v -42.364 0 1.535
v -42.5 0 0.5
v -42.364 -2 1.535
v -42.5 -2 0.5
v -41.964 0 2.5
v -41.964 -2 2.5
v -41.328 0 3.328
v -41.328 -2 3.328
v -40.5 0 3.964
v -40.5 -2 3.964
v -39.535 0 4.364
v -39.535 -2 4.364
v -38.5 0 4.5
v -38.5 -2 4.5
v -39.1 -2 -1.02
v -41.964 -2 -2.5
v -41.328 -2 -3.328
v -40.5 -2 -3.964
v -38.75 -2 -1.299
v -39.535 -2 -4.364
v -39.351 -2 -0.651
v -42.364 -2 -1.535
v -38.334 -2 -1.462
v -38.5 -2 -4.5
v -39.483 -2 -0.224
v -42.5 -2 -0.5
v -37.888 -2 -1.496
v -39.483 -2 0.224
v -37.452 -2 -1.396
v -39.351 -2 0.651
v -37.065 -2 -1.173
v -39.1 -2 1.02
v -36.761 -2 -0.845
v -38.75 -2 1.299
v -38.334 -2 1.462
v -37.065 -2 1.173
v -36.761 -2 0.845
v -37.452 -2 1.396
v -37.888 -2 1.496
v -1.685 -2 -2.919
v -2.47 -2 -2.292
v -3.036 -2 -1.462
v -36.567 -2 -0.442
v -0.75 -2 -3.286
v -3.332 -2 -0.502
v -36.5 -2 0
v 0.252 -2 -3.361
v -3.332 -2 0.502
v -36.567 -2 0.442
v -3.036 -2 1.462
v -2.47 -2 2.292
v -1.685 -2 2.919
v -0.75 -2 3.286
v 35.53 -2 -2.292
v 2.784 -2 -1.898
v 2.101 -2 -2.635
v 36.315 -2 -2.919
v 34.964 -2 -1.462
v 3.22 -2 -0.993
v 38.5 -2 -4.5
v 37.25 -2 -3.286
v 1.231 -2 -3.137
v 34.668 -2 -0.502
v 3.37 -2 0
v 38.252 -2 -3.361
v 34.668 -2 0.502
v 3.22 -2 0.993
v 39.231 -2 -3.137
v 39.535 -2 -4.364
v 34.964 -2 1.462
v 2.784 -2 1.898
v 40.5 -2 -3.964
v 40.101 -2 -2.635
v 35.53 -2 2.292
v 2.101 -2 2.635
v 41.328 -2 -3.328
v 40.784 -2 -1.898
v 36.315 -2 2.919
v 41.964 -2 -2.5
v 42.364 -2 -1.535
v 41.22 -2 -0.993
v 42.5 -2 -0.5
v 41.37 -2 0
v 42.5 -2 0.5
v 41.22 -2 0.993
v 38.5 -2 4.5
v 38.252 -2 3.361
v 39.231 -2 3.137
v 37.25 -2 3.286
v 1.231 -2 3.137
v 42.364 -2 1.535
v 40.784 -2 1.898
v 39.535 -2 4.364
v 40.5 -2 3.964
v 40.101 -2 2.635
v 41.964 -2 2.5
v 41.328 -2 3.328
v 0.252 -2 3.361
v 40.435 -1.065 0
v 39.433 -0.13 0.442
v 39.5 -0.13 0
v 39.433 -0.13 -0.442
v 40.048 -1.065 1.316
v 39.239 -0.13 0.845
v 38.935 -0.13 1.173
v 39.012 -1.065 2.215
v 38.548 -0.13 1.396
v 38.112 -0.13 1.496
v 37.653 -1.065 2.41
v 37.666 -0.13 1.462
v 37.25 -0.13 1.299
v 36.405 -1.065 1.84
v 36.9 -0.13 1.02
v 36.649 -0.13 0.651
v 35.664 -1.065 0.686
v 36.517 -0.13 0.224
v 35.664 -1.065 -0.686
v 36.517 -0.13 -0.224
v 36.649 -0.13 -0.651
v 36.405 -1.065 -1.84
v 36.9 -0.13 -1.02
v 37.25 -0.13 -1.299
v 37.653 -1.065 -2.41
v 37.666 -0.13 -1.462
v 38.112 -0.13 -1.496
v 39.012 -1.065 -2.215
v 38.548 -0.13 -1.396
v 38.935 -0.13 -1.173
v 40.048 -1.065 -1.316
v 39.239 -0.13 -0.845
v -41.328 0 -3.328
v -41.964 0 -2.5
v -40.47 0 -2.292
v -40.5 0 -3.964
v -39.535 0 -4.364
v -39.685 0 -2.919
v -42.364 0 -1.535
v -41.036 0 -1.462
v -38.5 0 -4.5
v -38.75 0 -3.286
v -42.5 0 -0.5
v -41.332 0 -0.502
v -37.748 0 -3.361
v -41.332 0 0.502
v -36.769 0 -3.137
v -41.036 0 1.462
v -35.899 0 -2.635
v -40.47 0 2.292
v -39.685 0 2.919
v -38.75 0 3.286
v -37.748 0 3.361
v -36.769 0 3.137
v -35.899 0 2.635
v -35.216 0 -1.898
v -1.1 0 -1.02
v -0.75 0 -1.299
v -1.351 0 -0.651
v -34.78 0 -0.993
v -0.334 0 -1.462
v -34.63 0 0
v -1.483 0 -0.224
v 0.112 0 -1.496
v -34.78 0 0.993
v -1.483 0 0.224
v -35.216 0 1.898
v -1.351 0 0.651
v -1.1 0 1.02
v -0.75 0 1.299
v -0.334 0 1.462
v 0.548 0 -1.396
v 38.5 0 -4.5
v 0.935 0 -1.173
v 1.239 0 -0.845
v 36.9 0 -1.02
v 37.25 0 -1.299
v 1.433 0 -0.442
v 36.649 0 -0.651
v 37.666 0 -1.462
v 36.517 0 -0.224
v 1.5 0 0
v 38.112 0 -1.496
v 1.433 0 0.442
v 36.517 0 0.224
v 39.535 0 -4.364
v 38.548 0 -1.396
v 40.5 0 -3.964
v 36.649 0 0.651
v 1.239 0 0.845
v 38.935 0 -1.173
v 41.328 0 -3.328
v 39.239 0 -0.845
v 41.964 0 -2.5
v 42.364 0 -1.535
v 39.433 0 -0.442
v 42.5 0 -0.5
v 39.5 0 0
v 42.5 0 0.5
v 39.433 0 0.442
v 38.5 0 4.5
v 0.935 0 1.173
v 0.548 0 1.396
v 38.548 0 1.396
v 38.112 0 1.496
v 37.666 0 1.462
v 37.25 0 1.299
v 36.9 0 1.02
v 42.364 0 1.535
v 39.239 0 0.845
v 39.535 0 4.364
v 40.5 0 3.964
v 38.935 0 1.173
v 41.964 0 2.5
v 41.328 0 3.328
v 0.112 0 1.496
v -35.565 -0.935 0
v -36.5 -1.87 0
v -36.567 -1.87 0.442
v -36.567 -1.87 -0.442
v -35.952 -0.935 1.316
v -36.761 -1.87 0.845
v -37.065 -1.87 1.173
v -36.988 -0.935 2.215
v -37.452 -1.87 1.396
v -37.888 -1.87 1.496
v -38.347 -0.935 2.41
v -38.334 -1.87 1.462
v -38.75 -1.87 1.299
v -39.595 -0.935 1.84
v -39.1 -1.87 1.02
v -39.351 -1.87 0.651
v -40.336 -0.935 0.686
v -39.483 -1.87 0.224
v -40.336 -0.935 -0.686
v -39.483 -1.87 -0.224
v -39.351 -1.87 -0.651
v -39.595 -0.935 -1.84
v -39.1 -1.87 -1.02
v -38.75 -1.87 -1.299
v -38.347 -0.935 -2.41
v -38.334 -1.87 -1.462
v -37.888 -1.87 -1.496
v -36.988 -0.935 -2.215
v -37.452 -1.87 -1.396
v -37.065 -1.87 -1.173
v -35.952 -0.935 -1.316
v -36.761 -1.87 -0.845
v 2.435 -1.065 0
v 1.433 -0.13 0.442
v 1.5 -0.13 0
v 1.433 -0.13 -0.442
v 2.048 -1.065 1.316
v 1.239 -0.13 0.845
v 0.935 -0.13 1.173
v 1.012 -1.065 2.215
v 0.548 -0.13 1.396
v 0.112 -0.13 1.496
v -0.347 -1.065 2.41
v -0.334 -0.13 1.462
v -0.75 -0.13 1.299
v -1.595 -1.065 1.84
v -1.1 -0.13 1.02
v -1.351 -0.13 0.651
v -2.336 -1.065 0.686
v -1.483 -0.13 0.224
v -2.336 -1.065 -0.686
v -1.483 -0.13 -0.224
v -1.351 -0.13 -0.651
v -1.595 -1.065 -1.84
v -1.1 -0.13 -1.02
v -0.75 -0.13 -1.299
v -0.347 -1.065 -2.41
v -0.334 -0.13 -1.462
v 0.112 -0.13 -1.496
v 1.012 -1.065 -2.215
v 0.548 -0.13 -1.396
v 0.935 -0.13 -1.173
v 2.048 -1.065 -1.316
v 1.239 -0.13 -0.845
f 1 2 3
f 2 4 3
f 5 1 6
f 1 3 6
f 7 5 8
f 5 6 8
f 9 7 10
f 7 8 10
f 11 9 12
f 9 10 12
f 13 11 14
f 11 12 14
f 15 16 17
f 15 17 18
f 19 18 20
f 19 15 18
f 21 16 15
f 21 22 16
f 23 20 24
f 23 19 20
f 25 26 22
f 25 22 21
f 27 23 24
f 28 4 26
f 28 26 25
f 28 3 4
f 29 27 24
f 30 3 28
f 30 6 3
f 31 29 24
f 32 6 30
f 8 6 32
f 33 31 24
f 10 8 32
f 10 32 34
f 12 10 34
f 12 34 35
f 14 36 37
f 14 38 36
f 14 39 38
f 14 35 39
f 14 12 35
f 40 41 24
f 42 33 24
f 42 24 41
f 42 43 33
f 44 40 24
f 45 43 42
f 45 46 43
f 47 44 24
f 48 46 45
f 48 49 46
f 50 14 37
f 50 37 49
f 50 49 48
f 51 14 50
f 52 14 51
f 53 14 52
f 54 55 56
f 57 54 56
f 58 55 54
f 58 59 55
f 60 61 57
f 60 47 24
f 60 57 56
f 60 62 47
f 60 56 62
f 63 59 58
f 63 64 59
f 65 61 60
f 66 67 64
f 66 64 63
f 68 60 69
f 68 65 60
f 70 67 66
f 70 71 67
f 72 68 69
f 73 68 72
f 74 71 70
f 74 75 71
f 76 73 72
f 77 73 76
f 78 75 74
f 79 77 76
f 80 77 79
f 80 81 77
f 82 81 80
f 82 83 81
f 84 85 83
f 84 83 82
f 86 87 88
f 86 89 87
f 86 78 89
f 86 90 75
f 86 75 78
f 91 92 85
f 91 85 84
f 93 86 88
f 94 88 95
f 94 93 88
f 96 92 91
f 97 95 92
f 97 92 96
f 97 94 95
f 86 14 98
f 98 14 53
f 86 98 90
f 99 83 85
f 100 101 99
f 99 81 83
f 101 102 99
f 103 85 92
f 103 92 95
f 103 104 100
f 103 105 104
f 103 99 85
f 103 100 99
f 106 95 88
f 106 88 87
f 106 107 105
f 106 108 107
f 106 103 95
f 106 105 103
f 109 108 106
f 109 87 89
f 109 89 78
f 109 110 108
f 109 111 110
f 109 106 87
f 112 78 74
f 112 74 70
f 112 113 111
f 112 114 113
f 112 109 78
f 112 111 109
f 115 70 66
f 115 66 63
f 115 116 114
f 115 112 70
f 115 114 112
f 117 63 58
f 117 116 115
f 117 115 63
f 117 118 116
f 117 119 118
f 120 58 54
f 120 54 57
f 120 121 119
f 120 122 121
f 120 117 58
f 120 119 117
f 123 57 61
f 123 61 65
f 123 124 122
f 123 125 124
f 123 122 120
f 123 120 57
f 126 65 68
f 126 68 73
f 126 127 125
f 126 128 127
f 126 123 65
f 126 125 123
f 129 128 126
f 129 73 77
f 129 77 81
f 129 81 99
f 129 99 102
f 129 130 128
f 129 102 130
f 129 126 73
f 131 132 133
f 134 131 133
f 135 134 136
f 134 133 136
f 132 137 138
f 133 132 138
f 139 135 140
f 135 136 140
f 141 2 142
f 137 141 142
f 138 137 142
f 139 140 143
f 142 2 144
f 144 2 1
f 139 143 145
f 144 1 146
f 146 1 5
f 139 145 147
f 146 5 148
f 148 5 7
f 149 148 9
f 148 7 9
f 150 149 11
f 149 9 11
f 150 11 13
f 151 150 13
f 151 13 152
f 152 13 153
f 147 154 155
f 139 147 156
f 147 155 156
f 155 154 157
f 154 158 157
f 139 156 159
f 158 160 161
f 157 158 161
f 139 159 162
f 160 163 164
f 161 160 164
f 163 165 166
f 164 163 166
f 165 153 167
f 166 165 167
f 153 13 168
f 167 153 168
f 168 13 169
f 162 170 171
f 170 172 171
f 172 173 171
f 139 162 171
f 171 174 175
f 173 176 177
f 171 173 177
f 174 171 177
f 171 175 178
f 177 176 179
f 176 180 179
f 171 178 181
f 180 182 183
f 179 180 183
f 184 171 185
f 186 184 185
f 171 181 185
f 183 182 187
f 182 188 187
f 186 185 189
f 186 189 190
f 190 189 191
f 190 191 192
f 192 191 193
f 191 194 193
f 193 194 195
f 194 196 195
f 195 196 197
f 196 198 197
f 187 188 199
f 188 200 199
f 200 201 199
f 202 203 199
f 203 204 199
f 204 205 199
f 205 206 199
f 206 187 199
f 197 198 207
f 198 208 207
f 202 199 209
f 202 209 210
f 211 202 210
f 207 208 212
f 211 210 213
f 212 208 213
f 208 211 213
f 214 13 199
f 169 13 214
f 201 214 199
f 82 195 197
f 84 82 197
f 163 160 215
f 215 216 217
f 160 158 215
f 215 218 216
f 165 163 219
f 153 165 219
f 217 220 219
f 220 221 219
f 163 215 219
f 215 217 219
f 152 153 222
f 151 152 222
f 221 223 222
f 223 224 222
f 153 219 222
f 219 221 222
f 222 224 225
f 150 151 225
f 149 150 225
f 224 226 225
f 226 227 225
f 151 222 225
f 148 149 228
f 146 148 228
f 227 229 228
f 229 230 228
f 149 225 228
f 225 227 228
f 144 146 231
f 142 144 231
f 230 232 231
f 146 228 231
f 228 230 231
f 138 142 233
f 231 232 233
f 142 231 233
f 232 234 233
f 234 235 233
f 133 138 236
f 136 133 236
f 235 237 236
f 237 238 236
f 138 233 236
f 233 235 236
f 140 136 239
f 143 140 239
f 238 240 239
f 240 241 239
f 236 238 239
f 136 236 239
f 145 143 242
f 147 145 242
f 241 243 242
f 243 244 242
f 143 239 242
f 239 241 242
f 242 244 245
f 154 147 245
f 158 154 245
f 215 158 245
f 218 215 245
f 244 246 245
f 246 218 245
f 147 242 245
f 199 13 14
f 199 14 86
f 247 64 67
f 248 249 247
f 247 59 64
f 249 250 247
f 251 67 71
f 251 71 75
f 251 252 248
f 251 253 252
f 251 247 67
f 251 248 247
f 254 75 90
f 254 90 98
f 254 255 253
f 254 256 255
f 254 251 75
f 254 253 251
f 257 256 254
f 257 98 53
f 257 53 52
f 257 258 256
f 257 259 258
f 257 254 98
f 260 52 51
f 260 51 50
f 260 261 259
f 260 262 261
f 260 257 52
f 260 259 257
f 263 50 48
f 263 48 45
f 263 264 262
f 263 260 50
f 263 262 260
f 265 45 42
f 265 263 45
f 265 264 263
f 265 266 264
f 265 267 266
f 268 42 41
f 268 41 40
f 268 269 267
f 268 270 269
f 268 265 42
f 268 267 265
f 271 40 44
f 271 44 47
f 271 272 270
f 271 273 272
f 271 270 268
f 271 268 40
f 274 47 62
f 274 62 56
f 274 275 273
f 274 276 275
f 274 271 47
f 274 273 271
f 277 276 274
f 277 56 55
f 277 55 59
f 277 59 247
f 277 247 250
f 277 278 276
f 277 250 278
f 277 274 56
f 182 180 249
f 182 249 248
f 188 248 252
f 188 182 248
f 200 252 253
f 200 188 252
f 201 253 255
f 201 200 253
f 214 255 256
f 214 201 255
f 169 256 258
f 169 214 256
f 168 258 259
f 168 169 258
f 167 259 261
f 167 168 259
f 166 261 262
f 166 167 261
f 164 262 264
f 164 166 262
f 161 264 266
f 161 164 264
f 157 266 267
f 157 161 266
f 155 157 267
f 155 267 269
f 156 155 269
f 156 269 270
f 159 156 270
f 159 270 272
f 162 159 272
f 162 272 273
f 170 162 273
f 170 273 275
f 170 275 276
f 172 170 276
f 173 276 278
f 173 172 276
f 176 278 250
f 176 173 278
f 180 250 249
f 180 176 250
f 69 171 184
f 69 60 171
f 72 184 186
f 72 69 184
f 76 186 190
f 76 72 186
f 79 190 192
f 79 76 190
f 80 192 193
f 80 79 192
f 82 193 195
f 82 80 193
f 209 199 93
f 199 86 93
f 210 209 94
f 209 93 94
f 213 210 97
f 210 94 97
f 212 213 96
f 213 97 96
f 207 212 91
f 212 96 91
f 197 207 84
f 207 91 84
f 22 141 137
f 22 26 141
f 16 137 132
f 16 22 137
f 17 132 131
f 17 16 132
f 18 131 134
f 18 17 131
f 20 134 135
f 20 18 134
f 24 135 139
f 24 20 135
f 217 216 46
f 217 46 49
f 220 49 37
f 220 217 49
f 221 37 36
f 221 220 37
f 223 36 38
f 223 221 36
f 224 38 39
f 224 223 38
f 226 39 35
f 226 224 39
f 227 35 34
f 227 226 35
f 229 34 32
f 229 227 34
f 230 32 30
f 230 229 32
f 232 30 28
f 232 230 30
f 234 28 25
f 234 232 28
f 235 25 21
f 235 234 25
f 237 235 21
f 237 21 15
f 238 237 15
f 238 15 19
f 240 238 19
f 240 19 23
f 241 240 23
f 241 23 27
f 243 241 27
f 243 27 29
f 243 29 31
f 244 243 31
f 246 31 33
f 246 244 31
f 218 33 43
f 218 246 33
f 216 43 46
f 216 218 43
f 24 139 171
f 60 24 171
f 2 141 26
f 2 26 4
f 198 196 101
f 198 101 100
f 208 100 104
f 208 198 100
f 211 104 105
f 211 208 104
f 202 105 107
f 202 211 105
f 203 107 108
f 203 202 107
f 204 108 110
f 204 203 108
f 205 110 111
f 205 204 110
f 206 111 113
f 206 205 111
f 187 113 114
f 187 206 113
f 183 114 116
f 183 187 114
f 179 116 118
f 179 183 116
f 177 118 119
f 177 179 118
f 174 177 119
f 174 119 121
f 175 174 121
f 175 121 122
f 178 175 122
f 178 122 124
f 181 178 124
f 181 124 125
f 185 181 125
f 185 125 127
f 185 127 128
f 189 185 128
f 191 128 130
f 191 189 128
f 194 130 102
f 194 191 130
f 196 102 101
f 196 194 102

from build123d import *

# Parameters (mm, degrees)
F0_W     = 85
F0_H     = 9
F0_R     = 1.5
F1_DEPTH = 2
F2_R     = 4
F3_SIZE  = 1.87


with BuildPart() as f1:
    # F0 (on Front) → F1 (new body)
    with BuildSketch(Plane.XZ):
        Rectangle(F0_W, F0_H)
        with Locations((-38, 0)):
            Circle(F0_R, mode=Mode.SUBTRACT)
        Circle(F0_R, mode=Mode.SUBTRACT)
        with Locations((38, 0)):
            Circle(F0_R, mode=Mode.SUBTRACT)
    extrude(amount=F1_DEPTH)

    # F2
    f2_edges = [f1.edges().sort_by_distance(p)[0] for p in [
        (-42.5, -1, 4.5),
        (-42.5, -1, -4.5),
        (42.5, -1, -4.5),
        (42.5, -1, 4.5),
    ]]
    fillet(f2_edges, radius=F2_R)

    # F3
    f3_edges = [f1.edges().sort_by_distance(p)[0] for p in [
        (36.5, -2, 0),
        (-1.5, -2, 0),
        (-39.5, 0, 0),
    ]]
    chamfer(f3_edges, length=F3_SIZE)


solid = f1.part
